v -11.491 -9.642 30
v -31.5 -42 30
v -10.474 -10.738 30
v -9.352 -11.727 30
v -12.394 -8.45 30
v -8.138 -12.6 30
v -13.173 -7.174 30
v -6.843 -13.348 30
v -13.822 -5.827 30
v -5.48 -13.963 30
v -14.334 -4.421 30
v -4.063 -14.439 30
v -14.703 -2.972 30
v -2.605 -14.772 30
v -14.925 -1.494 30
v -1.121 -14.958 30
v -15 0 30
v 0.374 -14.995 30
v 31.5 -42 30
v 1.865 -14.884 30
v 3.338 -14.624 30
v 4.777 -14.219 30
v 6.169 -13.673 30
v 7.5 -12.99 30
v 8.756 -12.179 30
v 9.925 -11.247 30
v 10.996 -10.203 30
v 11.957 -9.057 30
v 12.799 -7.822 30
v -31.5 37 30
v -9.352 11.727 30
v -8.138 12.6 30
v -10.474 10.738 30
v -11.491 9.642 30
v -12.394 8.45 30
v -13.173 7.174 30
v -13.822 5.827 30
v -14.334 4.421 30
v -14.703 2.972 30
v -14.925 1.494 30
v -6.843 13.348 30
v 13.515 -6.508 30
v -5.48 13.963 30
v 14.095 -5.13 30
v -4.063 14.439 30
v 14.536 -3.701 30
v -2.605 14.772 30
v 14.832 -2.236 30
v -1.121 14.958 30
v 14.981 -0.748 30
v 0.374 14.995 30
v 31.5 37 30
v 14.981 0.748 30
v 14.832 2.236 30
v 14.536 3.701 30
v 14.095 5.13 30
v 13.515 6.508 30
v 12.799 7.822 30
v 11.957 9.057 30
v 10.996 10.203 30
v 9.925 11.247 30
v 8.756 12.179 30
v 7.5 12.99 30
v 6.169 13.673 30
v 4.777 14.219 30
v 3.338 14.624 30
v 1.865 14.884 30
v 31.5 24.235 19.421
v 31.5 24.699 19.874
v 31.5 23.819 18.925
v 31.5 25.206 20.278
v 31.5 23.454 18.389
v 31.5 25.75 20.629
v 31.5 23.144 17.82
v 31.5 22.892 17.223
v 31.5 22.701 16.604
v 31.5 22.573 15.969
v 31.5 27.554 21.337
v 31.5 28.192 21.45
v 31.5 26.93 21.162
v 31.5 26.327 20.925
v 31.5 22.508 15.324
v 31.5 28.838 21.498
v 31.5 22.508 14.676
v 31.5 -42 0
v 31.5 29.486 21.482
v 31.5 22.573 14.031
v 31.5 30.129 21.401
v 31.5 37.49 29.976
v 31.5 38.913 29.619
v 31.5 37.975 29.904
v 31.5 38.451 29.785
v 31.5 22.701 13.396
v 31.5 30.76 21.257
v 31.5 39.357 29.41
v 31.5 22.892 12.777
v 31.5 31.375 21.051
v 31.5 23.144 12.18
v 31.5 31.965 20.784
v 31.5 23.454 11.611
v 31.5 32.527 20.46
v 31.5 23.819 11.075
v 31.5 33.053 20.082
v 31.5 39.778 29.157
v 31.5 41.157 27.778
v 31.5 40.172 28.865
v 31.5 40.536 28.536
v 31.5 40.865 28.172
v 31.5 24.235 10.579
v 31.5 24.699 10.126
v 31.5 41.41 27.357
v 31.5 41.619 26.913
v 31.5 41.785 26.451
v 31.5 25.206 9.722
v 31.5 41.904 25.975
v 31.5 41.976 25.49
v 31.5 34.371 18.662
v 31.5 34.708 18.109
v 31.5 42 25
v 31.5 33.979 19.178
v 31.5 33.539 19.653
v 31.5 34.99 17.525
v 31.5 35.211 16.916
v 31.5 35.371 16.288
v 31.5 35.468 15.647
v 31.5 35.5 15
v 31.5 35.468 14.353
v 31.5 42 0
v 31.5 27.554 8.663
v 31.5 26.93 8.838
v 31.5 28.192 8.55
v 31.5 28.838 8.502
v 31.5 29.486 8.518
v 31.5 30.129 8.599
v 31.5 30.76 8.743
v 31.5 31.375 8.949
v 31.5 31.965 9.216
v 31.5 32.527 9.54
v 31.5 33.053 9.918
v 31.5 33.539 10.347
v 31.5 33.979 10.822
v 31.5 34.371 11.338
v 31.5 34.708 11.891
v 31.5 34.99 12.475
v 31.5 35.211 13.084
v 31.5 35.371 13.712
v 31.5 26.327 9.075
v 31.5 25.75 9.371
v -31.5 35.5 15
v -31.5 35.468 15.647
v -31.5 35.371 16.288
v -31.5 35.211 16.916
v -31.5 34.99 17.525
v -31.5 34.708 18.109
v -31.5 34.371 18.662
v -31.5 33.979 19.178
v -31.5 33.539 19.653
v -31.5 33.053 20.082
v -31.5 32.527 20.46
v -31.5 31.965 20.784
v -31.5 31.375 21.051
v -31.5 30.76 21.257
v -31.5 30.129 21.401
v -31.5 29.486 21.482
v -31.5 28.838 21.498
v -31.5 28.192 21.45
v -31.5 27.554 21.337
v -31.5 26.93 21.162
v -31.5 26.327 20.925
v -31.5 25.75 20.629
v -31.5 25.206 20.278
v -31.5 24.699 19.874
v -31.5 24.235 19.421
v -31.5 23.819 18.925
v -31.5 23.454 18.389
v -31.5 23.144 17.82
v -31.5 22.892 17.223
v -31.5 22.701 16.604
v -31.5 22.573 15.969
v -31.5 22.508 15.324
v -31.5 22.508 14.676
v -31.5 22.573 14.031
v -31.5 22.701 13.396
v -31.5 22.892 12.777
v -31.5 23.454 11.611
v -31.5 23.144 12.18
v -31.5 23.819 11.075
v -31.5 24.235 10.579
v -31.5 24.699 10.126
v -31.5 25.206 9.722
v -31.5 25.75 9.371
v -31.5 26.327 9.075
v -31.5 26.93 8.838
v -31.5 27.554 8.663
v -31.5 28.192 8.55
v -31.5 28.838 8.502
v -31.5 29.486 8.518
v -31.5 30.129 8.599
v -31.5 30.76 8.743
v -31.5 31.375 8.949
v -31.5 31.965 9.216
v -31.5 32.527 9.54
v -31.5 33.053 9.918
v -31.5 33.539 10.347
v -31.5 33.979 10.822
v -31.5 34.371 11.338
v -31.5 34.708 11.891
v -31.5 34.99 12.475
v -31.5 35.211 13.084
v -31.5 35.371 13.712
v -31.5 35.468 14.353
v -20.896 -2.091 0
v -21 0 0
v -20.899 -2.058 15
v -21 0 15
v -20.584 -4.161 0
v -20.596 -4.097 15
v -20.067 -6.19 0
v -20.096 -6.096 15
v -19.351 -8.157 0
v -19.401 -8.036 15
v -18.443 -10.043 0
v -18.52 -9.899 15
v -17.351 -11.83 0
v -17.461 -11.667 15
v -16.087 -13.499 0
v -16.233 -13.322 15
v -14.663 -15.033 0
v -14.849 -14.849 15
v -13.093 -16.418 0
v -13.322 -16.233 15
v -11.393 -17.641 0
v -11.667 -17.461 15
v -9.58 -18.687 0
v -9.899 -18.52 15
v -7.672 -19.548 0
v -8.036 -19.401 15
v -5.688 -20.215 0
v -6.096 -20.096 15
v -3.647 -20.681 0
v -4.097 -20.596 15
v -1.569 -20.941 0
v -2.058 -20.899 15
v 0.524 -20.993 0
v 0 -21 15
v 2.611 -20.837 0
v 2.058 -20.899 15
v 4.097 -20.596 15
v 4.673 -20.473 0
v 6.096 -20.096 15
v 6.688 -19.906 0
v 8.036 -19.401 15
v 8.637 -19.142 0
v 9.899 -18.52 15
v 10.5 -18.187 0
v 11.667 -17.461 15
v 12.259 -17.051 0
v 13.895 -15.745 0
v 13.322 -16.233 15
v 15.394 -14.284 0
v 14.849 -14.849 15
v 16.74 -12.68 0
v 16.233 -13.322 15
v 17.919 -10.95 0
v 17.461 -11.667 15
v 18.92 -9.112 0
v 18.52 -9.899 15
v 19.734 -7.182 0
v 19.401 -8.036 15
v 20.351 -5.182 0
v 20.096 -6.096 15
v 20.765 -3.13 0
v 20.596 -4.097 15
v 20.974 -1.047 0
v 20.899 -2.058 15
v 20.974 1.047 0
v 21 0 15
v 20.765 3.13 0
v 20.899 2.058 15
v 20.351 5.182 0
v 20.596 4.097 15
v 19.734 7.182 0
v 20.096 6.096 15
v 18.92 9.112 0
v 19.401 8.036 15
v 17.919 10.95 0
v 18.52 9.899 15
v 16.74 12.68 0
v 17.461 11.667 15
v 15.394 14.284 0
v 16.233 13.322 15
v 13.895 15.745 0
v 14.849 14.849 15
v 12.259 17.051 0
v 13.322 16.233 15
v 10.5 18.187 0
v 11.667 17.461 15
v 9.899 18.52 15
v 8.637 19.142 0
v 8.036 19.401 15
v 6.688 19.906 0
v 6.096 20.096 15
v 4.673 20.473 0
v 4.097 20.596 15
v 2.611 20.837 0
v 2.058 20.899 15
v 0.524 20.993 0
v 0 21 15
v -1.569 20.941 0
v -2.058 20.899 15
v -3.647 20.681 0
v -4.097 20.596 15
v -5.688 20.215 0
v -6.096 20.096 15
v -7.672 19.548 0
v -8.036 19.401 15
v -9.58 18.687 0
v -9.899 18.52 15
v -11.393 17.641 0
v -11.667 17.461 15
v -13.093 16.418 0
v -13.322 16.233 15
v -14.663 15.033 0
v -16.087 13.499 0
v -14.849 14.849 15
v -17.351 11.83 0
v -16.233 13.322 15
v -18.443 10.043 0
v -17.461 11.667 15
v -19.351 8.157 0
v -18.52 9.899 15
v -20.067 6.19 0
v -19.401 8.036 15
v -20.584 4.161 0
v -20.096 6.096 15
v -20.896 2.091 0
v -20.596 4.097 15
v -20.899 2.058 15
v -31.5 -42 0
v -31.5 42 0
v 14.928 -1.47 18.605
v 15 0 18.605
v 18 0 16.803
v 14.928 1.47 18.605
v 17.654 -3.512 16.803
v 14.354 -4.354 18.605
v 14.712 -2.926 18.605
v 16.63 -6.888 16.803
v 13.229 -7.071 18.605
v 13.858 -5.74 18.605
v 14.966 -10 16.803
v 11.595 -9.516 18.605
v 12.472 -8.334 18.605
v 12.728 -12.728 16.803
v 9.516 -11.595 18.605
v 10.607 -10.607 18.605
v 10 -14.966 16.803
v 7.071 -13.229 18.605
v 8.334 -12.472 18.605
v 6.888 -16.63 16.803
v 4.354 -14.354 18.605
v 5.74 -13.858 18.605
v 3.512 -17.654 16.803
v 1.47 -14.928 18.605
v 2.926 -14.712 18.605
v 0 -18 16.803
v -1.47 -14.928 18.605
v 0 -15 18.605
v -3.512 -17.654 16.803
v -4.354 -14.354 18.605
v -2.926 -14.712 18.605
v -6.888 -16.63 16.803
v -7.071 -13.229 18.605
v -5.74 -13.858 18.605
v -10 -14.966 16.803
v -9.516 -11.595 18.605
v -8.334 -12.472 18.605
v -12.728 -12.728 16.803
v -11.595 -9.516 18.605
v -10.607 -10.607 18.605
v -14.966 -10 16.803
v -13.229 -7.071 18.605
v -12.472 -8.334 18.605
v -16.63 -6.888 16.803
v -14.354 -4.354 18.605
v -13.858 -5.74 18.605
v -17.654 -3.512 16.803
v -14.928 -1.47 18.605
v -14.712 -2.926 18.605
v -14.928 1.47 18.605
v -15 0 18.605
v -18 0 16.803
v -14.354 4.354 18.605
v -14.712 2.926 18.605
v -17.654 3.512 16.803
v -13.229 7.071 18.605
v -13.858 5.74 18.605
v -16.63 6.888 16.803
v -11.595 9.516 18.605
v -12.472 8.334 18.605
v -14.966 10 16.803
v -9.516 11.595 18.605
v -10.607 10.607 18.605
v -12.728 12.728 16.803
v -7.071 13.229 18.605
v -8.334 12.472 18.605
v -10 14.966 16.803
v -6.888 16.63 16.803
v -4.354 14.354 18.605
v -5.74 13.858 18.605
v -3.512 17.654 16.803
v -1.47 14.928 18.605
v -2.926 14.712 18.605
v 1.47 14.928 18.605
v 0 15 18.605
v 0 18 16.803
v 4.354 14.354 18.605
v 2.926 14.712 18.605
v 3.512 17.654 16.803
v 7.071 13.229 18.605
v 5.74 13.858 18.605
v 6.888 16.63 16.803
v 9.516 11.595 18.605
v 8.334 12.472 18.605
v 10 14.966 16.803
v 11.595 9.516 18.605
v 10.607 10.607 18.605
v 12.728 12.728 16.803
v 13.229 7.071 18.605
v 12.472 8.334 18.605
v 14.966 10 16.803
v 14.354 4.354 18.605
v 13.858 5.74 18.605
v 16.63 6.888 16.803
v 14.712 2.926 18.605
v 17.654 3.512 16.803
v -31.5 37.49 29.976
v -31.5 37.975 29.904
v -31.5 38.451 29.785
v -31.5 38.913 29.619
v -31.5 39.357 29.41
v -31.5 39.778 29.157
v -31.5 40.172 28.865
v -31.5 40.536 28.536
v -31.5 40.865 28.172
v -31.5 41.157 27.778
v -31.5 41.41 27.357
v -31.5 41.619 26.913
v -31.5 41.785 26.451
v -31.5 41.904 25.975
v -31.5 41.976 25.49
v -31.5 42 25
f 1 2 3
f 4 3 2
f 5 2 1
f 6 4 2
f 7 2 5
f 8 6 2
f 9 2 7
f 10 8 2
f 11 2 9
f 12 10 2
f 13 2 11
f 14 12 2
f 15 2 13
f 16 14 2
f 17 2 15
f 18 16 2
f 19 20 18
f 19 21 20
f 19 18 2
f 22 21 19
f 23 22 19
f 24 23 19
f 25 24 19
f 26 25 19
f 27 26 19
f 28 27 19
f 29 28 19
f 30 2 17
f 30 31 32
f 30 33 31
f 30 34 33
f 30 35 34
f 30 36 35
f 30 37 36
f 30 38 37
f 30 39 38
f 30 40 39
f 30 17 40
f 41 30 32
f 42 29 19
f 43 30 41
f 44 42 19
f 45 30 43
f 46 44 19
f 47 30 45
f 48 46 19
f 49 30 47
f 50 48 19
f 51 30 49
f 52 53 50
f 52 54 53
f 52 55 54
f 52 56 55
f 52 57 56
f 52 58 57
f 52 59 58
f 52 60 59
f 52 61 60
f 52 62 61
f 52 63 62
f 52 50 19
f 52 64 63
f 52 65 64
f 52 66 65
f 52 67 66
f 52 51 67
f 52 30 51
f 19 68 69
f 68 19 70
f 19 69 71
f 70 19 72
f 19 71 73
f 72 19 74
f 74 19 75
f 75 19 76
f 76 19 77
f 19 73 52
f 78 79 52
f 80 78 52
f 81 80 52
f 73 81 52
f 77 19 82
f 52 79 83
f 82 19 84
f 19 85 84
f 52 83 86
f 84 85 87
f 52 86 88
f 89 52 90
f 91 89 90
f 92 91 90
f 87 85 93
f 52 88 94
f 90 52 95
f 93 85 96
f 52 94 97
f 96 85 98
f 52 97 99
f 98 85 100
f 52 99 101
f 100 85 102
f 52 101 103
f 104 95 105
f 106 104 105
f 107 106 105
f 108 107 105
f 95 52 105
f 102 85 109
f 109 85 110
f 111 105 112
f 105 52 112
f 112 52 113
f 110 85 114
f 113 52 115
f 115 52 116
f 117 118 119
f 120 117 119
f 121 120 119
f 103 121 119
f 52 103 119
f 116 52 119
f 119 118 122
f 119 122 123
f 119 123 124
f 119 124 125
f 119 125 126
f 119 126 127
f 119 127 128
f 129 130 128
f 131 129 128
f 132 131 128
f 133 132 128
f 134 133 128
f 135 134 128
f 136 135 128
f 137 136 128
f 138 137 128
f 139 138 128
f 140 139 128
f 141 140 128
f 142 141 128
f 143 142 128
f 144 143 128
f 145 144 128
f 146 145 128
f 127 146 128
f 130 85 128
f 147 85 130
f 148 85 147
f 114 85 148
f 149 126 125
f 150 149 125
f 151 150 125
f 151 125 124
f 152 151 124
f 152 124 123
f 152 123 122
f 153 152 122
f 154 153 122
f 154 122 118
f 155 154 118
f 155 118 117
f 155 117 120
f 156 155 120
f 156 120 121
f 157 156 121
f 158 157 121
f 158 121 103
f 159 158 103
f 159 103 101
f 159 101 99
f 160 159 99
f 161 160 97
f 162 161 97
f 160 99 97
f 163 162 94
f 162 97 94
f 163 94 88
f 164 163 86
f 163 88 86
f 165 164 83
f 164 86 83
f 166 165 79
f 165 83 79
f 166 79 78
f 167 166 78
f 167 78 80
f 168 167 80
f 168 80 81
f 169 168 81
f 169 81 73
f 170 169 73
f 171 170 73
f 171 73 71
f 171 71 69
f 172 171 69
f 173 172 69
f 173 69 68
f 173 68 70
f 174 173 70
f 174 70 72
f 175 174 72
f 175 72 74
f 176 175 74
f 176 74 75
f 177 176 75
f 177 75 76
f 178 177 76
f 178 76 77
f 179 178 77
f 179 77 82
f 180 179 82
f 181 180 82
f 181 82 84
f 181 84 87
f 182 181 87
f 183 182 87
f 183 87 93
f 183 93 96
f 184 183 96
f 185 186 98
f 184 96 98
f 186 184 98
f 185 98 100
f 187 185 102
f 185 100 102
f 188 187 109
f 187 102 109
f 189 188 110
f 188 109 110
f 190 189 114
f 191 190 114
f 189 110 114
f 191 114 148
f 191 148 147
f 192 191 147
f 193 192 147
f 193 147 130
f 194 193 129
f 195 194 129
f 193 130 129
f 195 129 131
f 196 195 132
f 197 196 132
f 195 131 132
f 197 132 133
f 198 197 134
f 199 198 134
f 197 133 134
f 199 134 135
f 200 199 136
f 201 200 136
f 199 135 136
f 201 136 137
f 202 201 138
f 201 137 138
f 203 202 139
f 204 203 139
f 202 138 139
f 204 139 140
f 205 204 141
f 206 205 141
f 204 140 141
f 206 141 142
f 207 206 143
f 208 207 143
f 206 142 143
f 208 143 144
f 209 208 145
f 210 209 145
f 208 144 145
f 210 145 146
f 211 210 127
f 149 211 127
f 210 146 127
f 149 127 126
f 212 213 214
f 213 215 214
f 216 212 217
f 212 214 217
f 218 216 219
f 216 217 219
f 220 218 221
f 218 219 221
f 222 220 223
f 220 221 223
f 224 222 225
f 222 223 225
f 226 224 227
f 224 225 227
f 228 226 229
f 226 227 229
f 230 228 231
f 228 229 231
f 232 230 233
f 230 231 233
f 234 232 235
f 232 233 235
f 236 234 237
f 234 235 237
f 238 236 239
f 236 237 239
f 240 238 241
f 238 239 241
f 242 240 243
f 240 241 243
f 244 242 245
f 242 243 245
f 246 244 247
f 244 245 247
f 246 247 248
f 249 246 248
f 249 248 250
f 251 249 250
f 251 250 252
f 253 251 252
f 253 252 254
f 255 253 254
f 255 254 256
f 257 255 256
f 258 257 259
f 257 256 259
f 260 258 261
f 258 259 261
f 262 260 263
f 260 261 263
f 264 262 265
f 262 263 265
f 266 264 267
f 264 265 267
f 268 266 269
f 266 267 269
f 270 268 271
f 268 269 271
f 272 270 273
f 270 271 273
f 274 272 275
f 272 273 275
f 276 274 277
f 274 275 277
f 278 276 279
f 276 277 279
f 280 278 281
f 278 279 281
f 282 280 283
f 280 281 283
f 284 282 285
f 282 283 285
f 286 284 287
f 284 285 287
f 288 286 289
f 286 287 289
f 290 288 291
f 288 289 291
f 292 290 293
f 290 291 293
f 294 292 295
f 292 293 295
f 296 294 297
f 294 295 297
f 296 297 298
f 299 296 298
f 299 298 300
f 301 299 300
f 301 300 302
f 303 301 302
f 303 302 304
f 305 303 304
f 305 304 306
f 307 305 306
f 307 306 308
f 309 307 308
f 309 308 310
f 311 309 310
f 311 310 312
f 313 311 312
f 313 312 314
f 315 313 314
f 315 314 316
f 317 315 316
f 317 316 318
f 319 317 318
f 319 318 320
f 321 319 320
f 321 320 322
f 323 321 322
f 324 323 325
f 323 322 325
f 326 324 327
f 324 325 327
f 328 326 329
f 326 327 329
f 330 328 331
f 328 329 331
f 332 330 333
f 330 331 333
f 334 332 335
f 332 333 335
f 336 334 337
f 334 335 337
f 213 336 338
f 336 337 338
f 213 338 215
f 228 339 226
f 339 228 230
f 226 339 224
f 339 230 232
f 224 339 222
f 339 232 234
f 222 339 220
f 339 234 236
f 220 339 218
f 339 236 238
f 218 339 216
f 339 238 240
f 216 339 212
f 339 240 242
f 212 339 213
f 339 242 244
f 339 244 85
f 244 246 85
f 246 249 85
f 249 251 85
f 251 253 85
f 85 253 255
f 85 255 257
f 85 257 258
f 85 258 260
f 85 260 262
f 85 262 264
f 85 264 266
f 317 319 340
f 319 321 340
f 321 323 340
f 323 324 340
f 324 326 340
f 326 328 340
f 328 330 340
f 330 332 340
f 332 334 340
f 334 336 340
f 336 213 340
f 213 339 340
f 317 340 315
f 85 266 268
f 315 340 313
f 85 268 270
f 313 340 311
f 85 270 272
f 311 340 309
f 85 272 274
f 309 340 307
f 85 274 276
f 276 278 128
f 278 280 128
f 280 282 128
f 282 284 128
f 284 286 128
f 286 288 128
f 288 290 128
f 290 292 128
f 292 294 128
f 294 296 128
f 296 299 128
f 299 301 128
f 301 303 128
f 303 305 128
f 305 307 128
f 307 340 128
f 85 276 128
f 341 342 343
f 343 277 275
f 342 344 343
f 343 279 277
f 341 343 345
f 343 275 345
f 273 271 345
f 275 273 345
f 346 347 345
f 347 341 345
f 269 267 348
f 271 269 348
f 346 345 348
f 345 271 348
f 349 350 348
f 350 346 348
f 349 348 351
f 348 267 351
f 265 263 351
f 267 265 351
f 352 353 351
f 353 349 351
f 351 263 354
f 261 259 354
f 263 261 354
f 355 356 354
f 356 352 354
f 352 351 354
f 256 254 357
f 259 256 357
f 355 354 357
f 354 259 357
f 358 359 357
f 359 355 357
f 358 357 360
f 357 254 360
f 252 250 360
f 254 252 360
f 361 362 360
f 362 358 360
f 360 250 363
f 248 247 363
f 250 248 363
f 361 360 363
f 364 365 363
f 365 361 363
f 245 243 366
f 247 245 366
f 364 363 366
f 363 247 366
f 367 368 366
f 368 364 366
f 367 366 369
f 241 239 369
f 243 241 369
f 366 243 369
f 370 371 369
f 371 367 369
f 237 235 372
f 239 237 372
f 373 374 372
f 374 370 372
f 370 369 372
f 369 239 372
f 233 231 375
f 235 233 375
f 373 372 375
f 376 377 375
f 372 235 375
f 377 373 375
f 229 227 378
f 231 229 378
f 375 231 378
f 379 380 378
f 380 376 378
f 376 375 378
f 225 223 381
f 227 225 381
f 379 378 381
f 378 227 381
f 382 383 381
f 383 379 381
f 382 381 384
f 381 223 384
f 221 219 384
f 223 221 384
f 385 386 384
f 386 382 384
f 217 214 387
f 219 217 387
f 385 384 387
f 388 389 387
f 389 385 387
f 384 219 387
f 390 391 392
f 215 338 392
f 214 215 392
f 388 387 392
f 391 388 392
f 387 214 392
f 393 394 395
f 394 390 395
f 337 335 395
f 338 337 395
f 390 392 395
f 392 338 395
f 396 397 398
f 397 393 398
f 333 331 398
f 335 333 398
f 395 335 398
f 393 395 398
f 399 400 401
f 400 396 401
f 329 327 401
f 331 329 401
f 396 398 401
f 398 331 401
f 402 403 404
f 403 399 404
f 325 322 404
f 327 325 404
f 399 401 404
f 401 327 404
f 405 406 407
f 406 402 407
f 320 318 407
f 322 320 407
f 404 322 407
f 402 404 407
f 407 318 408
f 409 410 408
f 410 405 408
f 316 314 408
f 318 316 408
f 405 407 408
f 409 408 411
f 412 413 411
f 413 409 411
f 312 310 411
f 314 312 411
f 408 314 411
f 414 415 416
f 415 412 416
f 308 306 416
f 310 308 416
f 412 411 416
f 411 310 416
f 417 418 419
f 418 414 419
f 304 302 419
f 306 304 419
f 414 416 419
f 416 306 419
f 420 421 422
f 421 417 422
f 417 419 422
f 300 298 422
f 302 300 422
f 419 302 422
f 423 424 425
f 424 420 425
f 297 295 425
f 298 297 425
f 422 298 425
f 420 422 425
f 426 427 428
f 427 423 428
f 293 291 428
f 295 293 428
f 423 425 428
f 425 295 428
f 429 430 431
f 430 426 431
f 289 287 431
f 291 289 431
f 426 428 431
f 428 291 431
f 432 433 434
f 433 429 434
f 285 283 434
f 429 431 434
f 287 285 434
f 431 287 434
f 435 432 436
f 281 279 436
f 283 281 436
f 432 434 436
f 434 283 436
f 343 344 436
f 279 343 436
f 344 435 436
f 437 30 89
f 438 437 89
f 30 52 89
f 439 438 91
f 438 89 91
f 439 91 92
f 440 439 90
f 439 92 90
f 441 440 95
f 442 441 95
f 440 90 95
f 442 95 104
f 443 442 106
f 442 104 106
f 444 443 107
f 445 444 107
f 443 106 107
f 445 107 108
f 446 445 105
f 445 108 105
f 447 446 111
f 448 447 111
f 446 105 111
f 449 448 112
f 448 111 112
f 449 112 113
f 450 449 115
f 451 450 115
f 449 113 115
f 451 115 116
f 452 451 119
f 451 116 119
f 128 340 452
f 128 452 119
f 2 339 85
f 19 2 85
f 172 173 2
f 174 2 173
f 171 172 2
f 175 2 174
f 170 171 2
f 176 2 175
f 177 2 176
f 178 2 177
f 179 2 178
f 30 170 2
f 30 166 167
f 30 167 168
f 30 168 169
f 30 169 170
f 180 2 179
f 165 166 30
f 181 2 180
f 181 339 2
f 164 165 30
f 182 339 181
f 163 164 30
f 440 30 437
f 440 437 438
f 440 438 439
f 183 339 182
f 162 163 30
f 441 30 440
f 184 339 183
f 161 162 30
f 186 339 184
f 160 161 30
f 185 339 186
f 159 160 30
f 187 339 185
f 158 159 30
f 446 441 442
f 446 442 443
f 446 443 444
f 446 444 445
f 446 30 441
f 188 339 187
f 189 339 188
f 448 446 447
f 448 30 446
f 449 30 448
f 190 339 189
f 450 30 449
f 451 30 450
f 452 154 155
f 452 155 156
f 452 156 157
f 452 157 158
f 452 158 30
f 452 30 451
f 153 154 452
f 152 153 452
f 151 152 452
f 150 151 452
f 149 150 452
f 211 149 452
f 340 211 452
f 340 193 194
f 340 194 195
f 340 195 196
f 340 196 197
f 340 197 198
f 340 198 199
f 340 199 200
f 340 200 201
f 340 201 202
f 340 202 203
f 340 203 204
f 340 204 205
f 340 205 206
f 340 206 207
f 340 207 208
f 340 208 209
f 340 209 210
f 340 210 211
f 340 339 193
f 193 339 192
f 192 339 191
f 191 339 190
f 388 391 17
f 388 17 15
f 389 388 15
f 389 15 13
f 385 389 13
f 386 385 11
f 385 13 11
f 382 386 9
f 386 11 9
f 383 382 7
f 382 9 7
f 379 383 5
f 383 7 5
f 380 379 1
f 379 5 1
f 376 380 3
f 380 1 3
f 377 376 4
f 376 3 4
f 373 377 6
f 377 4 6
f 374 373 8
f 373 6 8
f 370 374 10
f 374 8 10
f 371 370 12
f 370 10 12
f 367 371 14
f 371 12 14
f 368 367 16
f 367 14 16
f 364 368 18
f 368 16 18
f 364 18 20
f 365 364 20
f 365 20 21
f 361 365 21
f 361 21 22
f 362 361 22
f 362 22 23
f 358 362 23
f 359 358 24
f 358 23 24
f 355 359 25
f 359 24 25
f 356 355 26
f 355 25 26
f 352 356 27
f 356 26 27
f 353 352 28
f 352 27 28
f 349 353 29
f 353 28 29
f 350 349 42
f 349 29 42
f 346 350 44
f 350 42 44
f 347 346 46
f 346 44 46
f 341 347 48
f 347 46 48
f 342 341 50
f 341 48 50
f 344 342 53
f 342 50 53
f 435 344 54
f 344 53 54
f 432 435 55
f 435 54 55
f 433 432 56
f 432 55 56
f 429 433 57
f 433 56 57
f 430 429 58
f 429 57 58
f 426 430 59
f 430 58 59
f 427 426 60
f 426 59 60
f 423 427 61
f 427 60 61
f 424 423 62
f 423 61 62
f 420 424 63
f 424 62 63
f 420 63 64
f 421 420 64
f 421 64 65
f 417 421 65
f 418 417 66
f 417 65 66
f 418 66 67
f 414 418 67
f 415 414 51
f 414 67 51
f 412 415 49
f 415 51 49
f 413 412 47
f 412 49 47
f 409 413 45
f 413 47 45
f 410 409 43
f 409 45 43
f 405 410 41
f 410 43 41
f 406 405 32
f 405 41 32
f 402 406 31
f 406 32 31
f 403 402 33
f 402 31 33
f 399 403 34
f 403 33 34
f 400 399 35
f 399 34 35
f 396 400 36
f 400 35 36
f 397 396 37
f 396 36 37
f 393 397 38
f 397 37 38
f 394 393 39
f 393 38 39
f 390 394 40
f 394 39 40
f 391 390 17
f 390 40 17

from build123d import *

# Parameters (mm, degrees)
F0_W     = 63
F0_H     = 84
F2_DEPTH = 30
F3_D     = 30
F5_D     = 42
F5_DEPTH = 15
F5_TIP   = 12.6180729996
F7_D     = 13
F8_R     = 5


with BuildPart() as f2:
    # F0 (on Top) → F2 (new body)
    with BuildSketch(Plane.XY):
        Rectangle(F0_W, F0_H)
    extrude(amount=F2_DEPTH)

    # F3 (through all)
    with Locations(Plane(origin=(0, 0, 0), x_dir=(1, 0, 0), z_dir=(0, 0, -1))):
        with Locations((0, 0)):
            Hole(F3_D / 2)

    # F5
    with Locations(Plane(origin=(0, 0, 0), x_dir=(1, 0, 0), z_dir=(0, 0, -1))):
        with Locations((0, 0)):
            Hole(F5_D / 2, depth=F5_DEPTH)
            with Locations((0, 0, -(F5_DEPTH + F5_TIP / 2))):  # 118° drill point
                Cone(0, F5_D / 2, F5_TIP, mode=Mode.SUBTRACT)

    # F7 (through all)
    with Locations(Plane(origin=(-31.5, 0, 0), x_dir=(0, -1, 0), z_dir=(-1, 0, 0))):
        with Locations((-29, 15)):
            Hole(F7_D / 2)

    # F8
    f8_edges = [f2.edges().sort_by_distance(p)[0] for p in [
        (0, 42, 30),
    ]]
    fillet(f8_edges, radius=F8_R)


solid = f2.part
